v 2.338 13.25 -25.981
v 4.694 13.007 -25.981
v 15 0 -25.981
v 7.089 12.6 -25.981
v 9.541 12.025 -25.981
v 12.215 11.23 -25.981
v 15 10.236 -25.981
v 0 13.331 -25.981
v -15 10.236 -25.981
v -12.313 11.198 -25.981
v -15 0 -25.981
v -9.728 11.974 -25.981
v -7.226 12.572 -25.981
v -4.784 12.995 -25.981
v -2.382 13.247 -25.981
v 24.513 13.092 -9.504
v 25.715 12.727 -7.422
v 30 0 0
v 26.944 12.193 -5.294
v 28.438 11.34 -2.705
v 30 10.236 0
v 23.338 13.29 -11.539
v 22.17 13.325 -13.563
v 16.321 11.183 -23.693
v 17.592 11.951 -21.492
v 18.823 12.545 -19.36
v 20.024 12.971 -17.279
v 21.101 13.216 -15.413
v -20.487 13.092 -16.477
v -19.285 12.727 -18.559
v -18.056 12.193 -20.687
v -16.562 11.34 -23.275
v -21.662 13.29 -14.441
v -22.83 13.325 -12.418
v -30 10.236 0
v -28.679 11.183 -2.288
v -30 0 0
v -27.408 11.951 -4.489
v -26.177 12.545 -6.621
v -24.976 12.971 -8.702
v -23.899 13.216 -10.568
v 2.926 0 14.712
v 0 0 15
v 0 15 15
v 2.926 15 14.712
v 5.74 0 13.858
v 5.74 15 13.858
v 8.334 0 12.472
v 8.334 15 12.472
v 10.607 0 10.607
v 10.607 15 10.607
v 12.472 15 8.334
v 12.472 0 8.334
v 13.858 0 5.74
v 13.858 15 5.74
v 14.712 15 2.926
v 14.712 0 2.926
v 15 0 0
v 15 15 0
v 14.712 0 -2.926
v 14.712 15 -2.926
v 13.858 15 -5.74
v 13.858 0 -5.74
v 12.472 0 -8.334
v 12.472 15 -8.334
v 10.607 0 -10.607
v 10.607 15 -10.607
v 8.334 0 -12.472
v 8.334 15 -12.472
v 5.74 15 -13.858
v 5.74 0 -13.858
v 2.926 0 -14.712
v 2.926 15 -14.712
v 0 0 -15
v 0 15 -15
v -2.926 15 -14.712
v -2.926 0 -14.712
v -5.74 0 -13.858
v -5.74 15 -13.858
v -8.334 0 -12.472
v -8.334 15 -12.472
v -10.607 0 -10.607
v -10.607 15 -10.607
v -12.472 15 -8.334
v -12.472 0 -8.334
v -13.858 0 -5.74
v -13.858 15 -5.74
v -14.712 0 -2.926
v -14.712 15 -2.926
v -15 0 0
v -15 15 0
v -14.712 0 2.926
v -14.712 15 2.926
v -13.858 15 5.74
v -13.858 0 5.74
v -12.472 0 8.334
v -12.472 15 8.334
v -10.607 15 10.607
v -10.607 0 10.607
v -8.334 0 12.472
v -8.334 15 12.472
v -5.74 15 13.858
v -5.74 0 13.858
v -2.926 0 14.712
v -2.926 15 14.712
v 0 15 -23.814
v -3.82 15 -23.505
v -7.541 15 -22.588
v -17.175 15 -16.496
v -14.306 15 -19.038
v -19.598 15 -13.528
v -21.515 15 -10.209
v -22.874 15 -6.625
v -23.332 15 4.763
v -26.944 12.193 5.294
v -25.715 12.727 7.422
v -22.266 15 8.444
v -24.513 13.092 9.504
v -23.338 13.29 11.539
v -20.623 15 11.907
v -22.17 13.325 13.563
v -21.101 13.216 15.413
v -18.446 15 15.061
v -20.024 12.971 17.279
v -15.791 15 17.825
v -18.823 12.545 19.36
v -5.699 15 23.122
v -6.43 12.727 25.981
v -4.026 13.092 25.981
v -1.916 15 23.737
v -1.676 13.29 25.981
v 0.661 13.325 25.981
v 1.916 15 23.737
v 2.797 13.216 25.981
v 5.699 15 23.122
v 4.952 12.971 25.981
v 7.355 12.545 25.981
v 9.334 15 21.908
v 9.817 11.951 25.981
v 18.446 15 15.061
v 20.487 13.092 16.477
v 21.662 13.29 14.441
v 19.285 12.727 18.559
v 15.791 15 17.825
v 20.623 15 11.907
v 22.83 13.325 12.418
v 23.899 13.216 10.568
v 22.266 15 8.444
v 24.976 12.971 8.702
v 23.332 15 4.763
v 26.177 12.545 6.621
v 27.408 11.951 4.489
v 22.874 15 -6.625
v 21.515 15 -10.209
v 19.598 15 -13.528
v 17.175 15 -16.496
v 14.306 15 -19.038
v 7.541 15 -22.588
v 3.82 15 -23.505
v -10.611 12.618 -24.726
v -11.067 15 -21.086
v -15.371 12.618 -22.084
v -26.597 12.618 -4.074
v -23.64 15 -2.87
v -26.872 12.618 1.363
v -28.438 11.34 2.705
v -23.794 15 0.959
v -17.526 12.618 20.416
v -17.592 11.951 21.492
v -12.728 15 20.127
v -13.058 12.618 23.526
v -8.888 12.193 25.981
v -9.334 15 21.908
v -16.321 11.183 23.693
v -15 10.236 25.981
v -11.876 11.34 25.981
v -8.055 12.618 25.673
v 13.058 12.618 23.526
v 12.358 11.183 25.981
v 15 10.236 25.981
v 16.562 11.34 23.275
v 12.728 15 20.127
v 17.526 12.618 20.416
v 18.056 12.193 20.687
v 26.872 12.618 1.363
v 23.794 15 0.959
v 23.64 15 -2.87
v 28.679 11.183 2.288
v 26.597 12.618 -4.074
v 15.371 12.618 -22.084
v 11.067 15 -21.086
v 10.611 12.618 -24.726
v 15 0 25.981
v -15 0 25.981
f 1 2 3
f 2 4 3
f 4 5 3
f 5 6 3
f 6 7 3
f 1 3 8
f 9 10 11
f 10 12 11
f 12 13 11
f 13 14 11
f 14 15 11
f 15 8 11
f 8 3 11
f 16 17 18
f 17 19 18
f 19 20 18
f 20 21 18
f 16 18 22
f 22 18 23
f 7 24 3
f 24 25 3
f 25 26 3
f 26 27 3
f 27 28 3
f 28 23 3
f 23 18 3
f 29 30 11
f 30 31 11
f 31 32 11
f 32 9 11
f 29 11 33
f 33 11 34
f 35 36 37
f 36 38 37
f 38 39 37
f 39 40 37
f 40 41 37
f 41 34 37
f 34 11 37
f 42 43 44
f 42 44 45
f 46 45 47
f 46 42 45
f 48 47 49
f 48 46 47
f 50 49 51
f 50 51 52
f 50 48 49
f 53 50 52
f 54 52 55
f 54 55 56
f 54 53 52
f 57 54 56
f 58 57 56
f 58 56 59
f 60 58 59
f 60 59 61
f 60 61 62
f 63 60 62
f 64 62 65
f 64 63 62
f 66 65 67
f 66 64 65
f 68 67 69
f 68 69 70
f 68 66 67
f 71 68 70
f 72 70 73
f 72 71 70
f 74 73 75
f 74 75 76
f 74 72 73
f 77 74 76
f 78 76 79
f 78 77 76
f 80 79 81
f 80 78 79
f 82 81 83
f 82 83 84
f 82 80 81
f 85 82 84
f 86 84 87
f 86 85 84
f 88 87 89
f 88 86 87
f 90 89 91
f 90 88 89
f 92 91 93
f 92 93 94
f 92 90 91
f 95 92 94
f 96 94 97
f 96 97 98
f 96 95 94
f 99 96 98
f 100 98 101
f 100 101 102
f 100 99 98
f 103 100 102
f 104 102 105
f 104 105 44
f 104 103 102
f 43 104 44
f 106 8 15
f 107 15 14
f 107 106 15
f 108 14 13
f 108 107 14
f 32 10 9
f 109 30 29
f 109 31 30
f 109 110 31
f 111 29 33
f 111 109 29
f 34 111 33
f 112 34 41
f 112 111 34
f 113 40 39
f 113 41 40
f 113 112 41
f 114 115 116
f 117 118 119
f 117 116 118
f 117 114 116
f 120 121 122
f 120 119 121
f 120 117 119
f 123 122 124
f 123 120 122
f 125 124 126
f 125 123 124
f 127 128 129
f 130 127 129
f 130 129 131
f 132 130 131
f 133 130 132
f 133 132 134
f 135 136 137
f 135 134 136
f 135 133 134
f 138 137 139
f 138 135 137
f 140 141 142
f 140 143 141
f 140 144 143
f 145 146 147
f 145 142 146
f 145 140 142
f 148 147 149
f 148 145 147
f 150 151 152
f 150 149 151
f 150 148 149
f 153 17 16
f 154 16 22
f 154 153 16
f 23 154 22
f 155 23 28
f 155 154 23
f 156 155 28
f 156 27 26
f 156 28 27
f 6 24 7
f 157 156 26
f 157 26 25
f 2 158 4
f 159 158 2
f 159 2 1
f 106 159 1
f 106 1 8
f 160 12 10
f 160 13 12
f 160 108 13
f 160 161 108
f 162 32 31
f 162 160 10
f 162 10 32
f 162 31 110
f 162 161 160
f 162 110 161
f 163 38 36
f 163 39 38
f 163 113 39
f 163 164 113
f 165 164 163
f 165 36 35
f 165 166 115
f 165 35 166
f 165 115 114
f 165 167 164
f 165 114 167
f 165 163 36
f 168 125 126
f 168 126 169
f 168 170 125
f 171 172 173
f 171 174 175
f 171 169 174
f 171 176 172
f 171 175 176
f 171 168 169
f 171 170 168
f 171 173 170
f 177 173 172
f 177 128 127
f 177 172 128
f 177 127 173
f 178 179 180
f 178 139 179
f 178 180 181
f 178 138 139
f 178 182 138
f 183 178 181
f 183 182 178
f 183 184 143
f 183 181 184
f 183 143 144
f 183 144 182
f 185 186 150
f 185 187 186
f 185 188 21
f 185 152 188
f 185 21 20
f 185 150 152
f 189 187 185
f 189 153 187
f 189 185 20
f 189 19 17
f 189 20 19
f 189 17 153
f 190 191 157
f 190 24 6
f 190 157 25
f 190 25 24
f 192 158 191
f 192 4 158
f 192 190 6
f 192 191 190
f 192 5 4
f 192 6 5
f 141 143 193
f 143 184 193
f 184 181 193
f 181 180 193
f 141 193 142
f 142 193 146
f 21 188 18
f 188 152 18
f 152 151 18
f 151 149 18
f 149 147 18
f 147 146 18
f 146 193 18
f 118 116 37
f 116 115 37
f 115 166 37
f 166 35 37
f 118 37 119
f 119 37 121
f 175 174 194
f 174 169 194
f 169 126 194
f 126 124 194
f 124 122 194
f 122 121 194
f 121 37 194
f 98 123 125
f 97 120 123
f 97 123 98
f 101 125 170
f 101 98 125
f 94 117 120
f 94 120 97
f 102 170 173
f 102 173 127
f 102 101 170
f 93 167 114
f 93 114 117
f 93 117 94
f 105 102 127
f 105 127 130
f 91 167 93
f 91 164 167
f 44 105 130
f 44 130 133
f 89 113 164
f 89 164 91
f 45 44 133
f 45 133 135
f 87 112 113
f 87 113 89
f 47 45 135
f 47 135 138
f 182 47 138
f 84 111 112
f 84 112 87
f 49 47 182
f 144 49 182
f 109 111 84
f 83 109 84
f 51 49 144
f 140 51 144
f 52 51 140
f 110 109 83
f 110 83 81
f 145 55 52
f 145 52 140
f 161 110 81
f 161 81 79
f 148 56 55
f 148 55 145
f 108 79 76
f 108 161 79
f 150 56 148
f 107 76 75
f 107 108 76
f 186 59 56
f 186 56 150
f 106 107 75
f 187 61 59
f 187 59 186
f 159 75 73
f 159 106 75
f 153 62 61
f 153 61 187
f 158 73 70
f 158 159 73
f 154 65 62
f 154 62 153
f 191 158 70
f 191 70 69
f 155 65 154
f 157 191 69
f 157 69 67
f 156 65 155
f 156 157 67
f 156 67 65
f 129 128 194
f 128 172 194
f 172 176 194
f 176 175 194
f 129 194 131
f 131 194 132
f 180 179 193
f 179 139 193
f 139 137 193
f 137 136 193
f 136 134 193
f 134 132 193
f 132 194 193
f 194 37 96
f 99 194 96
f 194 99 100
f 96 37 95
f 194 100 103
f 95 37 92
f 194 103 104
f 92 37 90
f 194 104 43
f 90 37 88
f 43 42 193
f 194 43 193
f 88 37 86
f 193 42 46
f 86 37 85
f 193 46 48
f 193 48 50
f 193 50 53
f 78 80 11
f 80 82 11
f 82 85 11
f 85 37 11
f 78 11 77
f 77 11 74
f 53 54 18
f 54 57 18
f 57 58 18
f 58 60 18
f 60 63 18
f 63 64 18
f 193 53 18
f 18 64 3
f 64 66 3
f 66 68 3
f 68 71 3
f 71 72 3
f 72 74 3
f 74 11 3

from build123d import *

# Parameters (mm, degrees)
SKETCH1_R           = 15
BOSS_EXTRUDE1_DEPTH = 15


with BuildPart() as part:
    # Sketch1 → Boss-Extrude1 (new body)
    with BuildSketch(Plane(origin=(0, 0, 0), x_dir=(1, 0, 0), z_dir=(0, 1, 0))):
        Polygon((30, 0), (15, 25.980762114), (-15, 25.980762114), (-30, 0), (-15, -25.980762114), (15, -25.980762114), align=None)
        with Locations(Location((0, 0, 0), (0, 0, 270))):
            Circle(SKETCH1_R, mode=Mode.SUBTRACT)
    extrude(amount=BOSS_EXTRUDE1_DEPTH)

    # Sketch3 → Cut-Revolve1 (revolve, cut)
    with BuildSketch(Plane.XY, mode=Mode.PRIVATE) as cut_revolve1_sk:
        Polygon((-30, 15), (-30, 10.235882569), (-23.813738417, 15), align=None)
    revolve(cut_revolve1_sk.sketch.rotate(Axis((0, 0, 0), (0, 1, 0)), 270), axis=Axis((0, 0, 0), (0, 1, 0)), mode=Mode.SUBTRACT)


solid = part.part
